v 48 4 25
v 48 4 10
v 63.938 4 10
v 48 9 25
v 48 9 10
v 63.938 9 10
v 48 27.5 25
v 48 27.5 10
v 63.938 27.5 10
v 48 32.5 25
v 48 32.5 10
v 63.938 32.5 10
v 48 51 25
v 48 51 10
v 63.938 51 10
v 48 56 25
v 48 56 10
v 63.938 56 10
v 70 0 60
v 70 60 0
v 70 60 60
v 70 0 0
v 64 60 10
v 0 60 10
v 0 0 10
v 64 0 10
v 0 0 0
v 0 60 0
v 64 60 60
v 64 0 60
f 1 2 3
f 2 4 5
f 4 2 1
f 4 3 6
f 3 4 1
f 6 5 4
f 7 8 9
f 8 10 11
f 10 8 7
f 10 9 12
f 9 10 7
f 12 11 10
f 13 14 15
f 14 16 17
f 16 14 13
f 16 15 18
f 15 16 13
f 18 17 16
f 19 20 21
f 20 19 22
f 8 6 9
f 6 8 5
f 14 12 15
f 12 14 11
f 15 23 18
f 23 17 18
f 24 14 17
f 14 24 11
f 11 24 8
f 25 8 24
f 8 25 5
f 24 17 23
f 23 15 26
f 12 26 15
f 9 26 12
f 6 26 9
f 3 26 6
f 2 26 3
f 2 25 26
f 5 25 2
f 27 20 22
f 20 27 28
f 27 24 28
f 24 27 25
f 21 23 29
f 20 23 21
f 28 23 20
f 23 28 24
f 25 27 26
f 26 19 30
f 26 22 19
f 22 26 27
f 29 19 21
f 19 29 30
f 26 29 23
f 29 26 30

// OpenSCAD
$fn = 32;

// ----------------------------------------------------------------------
// Rib bracket: 3-gusset L bracket
// ----------------------------------------------------------------------

// --- parameters (mm) ---
base_l = 70;              // foot length, X
base_w = 60;              // foot width, Y
base_t = 10;              // foot thickness
plate_t = 6;              // upright plate thickness
plate_h = 60;             // overall height
gus_l = 16;               // gusset leg along the foot
gus_h = 16;               // gusset height
gus_t = 5;                // gusset thickness
gus_edge = 4;             // gusset margin from the foot edge
n_gus = 3;                // gusset count
fit_tol = 0.02;           // tolerance for press fits, mm
free_tol = 0.2;           // tolerance for clearance fits, mm

gus_pitch = (base_w - 2 * gus_edge - gus_t) / (n_gus - 1);  // gusset pitch

union() {
  cube([base_l, base_w, base_t]);
  translate([base_l - plate_t, 0, base_t - 1])
    cube([plate_t, base_w, plate_h - base_t + 1]);
  for (i = [0 : n_gus - 1])
    translate([base_l - plate_t - gus_l, gus_edge + i * gus_pitch, base_t - 1])
      rotate([-90, 0, 0])
        linear_extrude(height = gus_t)
          polygon(points = [[0, 0], [gus_l + 1, 0], [0, -gus_h]]);
}
